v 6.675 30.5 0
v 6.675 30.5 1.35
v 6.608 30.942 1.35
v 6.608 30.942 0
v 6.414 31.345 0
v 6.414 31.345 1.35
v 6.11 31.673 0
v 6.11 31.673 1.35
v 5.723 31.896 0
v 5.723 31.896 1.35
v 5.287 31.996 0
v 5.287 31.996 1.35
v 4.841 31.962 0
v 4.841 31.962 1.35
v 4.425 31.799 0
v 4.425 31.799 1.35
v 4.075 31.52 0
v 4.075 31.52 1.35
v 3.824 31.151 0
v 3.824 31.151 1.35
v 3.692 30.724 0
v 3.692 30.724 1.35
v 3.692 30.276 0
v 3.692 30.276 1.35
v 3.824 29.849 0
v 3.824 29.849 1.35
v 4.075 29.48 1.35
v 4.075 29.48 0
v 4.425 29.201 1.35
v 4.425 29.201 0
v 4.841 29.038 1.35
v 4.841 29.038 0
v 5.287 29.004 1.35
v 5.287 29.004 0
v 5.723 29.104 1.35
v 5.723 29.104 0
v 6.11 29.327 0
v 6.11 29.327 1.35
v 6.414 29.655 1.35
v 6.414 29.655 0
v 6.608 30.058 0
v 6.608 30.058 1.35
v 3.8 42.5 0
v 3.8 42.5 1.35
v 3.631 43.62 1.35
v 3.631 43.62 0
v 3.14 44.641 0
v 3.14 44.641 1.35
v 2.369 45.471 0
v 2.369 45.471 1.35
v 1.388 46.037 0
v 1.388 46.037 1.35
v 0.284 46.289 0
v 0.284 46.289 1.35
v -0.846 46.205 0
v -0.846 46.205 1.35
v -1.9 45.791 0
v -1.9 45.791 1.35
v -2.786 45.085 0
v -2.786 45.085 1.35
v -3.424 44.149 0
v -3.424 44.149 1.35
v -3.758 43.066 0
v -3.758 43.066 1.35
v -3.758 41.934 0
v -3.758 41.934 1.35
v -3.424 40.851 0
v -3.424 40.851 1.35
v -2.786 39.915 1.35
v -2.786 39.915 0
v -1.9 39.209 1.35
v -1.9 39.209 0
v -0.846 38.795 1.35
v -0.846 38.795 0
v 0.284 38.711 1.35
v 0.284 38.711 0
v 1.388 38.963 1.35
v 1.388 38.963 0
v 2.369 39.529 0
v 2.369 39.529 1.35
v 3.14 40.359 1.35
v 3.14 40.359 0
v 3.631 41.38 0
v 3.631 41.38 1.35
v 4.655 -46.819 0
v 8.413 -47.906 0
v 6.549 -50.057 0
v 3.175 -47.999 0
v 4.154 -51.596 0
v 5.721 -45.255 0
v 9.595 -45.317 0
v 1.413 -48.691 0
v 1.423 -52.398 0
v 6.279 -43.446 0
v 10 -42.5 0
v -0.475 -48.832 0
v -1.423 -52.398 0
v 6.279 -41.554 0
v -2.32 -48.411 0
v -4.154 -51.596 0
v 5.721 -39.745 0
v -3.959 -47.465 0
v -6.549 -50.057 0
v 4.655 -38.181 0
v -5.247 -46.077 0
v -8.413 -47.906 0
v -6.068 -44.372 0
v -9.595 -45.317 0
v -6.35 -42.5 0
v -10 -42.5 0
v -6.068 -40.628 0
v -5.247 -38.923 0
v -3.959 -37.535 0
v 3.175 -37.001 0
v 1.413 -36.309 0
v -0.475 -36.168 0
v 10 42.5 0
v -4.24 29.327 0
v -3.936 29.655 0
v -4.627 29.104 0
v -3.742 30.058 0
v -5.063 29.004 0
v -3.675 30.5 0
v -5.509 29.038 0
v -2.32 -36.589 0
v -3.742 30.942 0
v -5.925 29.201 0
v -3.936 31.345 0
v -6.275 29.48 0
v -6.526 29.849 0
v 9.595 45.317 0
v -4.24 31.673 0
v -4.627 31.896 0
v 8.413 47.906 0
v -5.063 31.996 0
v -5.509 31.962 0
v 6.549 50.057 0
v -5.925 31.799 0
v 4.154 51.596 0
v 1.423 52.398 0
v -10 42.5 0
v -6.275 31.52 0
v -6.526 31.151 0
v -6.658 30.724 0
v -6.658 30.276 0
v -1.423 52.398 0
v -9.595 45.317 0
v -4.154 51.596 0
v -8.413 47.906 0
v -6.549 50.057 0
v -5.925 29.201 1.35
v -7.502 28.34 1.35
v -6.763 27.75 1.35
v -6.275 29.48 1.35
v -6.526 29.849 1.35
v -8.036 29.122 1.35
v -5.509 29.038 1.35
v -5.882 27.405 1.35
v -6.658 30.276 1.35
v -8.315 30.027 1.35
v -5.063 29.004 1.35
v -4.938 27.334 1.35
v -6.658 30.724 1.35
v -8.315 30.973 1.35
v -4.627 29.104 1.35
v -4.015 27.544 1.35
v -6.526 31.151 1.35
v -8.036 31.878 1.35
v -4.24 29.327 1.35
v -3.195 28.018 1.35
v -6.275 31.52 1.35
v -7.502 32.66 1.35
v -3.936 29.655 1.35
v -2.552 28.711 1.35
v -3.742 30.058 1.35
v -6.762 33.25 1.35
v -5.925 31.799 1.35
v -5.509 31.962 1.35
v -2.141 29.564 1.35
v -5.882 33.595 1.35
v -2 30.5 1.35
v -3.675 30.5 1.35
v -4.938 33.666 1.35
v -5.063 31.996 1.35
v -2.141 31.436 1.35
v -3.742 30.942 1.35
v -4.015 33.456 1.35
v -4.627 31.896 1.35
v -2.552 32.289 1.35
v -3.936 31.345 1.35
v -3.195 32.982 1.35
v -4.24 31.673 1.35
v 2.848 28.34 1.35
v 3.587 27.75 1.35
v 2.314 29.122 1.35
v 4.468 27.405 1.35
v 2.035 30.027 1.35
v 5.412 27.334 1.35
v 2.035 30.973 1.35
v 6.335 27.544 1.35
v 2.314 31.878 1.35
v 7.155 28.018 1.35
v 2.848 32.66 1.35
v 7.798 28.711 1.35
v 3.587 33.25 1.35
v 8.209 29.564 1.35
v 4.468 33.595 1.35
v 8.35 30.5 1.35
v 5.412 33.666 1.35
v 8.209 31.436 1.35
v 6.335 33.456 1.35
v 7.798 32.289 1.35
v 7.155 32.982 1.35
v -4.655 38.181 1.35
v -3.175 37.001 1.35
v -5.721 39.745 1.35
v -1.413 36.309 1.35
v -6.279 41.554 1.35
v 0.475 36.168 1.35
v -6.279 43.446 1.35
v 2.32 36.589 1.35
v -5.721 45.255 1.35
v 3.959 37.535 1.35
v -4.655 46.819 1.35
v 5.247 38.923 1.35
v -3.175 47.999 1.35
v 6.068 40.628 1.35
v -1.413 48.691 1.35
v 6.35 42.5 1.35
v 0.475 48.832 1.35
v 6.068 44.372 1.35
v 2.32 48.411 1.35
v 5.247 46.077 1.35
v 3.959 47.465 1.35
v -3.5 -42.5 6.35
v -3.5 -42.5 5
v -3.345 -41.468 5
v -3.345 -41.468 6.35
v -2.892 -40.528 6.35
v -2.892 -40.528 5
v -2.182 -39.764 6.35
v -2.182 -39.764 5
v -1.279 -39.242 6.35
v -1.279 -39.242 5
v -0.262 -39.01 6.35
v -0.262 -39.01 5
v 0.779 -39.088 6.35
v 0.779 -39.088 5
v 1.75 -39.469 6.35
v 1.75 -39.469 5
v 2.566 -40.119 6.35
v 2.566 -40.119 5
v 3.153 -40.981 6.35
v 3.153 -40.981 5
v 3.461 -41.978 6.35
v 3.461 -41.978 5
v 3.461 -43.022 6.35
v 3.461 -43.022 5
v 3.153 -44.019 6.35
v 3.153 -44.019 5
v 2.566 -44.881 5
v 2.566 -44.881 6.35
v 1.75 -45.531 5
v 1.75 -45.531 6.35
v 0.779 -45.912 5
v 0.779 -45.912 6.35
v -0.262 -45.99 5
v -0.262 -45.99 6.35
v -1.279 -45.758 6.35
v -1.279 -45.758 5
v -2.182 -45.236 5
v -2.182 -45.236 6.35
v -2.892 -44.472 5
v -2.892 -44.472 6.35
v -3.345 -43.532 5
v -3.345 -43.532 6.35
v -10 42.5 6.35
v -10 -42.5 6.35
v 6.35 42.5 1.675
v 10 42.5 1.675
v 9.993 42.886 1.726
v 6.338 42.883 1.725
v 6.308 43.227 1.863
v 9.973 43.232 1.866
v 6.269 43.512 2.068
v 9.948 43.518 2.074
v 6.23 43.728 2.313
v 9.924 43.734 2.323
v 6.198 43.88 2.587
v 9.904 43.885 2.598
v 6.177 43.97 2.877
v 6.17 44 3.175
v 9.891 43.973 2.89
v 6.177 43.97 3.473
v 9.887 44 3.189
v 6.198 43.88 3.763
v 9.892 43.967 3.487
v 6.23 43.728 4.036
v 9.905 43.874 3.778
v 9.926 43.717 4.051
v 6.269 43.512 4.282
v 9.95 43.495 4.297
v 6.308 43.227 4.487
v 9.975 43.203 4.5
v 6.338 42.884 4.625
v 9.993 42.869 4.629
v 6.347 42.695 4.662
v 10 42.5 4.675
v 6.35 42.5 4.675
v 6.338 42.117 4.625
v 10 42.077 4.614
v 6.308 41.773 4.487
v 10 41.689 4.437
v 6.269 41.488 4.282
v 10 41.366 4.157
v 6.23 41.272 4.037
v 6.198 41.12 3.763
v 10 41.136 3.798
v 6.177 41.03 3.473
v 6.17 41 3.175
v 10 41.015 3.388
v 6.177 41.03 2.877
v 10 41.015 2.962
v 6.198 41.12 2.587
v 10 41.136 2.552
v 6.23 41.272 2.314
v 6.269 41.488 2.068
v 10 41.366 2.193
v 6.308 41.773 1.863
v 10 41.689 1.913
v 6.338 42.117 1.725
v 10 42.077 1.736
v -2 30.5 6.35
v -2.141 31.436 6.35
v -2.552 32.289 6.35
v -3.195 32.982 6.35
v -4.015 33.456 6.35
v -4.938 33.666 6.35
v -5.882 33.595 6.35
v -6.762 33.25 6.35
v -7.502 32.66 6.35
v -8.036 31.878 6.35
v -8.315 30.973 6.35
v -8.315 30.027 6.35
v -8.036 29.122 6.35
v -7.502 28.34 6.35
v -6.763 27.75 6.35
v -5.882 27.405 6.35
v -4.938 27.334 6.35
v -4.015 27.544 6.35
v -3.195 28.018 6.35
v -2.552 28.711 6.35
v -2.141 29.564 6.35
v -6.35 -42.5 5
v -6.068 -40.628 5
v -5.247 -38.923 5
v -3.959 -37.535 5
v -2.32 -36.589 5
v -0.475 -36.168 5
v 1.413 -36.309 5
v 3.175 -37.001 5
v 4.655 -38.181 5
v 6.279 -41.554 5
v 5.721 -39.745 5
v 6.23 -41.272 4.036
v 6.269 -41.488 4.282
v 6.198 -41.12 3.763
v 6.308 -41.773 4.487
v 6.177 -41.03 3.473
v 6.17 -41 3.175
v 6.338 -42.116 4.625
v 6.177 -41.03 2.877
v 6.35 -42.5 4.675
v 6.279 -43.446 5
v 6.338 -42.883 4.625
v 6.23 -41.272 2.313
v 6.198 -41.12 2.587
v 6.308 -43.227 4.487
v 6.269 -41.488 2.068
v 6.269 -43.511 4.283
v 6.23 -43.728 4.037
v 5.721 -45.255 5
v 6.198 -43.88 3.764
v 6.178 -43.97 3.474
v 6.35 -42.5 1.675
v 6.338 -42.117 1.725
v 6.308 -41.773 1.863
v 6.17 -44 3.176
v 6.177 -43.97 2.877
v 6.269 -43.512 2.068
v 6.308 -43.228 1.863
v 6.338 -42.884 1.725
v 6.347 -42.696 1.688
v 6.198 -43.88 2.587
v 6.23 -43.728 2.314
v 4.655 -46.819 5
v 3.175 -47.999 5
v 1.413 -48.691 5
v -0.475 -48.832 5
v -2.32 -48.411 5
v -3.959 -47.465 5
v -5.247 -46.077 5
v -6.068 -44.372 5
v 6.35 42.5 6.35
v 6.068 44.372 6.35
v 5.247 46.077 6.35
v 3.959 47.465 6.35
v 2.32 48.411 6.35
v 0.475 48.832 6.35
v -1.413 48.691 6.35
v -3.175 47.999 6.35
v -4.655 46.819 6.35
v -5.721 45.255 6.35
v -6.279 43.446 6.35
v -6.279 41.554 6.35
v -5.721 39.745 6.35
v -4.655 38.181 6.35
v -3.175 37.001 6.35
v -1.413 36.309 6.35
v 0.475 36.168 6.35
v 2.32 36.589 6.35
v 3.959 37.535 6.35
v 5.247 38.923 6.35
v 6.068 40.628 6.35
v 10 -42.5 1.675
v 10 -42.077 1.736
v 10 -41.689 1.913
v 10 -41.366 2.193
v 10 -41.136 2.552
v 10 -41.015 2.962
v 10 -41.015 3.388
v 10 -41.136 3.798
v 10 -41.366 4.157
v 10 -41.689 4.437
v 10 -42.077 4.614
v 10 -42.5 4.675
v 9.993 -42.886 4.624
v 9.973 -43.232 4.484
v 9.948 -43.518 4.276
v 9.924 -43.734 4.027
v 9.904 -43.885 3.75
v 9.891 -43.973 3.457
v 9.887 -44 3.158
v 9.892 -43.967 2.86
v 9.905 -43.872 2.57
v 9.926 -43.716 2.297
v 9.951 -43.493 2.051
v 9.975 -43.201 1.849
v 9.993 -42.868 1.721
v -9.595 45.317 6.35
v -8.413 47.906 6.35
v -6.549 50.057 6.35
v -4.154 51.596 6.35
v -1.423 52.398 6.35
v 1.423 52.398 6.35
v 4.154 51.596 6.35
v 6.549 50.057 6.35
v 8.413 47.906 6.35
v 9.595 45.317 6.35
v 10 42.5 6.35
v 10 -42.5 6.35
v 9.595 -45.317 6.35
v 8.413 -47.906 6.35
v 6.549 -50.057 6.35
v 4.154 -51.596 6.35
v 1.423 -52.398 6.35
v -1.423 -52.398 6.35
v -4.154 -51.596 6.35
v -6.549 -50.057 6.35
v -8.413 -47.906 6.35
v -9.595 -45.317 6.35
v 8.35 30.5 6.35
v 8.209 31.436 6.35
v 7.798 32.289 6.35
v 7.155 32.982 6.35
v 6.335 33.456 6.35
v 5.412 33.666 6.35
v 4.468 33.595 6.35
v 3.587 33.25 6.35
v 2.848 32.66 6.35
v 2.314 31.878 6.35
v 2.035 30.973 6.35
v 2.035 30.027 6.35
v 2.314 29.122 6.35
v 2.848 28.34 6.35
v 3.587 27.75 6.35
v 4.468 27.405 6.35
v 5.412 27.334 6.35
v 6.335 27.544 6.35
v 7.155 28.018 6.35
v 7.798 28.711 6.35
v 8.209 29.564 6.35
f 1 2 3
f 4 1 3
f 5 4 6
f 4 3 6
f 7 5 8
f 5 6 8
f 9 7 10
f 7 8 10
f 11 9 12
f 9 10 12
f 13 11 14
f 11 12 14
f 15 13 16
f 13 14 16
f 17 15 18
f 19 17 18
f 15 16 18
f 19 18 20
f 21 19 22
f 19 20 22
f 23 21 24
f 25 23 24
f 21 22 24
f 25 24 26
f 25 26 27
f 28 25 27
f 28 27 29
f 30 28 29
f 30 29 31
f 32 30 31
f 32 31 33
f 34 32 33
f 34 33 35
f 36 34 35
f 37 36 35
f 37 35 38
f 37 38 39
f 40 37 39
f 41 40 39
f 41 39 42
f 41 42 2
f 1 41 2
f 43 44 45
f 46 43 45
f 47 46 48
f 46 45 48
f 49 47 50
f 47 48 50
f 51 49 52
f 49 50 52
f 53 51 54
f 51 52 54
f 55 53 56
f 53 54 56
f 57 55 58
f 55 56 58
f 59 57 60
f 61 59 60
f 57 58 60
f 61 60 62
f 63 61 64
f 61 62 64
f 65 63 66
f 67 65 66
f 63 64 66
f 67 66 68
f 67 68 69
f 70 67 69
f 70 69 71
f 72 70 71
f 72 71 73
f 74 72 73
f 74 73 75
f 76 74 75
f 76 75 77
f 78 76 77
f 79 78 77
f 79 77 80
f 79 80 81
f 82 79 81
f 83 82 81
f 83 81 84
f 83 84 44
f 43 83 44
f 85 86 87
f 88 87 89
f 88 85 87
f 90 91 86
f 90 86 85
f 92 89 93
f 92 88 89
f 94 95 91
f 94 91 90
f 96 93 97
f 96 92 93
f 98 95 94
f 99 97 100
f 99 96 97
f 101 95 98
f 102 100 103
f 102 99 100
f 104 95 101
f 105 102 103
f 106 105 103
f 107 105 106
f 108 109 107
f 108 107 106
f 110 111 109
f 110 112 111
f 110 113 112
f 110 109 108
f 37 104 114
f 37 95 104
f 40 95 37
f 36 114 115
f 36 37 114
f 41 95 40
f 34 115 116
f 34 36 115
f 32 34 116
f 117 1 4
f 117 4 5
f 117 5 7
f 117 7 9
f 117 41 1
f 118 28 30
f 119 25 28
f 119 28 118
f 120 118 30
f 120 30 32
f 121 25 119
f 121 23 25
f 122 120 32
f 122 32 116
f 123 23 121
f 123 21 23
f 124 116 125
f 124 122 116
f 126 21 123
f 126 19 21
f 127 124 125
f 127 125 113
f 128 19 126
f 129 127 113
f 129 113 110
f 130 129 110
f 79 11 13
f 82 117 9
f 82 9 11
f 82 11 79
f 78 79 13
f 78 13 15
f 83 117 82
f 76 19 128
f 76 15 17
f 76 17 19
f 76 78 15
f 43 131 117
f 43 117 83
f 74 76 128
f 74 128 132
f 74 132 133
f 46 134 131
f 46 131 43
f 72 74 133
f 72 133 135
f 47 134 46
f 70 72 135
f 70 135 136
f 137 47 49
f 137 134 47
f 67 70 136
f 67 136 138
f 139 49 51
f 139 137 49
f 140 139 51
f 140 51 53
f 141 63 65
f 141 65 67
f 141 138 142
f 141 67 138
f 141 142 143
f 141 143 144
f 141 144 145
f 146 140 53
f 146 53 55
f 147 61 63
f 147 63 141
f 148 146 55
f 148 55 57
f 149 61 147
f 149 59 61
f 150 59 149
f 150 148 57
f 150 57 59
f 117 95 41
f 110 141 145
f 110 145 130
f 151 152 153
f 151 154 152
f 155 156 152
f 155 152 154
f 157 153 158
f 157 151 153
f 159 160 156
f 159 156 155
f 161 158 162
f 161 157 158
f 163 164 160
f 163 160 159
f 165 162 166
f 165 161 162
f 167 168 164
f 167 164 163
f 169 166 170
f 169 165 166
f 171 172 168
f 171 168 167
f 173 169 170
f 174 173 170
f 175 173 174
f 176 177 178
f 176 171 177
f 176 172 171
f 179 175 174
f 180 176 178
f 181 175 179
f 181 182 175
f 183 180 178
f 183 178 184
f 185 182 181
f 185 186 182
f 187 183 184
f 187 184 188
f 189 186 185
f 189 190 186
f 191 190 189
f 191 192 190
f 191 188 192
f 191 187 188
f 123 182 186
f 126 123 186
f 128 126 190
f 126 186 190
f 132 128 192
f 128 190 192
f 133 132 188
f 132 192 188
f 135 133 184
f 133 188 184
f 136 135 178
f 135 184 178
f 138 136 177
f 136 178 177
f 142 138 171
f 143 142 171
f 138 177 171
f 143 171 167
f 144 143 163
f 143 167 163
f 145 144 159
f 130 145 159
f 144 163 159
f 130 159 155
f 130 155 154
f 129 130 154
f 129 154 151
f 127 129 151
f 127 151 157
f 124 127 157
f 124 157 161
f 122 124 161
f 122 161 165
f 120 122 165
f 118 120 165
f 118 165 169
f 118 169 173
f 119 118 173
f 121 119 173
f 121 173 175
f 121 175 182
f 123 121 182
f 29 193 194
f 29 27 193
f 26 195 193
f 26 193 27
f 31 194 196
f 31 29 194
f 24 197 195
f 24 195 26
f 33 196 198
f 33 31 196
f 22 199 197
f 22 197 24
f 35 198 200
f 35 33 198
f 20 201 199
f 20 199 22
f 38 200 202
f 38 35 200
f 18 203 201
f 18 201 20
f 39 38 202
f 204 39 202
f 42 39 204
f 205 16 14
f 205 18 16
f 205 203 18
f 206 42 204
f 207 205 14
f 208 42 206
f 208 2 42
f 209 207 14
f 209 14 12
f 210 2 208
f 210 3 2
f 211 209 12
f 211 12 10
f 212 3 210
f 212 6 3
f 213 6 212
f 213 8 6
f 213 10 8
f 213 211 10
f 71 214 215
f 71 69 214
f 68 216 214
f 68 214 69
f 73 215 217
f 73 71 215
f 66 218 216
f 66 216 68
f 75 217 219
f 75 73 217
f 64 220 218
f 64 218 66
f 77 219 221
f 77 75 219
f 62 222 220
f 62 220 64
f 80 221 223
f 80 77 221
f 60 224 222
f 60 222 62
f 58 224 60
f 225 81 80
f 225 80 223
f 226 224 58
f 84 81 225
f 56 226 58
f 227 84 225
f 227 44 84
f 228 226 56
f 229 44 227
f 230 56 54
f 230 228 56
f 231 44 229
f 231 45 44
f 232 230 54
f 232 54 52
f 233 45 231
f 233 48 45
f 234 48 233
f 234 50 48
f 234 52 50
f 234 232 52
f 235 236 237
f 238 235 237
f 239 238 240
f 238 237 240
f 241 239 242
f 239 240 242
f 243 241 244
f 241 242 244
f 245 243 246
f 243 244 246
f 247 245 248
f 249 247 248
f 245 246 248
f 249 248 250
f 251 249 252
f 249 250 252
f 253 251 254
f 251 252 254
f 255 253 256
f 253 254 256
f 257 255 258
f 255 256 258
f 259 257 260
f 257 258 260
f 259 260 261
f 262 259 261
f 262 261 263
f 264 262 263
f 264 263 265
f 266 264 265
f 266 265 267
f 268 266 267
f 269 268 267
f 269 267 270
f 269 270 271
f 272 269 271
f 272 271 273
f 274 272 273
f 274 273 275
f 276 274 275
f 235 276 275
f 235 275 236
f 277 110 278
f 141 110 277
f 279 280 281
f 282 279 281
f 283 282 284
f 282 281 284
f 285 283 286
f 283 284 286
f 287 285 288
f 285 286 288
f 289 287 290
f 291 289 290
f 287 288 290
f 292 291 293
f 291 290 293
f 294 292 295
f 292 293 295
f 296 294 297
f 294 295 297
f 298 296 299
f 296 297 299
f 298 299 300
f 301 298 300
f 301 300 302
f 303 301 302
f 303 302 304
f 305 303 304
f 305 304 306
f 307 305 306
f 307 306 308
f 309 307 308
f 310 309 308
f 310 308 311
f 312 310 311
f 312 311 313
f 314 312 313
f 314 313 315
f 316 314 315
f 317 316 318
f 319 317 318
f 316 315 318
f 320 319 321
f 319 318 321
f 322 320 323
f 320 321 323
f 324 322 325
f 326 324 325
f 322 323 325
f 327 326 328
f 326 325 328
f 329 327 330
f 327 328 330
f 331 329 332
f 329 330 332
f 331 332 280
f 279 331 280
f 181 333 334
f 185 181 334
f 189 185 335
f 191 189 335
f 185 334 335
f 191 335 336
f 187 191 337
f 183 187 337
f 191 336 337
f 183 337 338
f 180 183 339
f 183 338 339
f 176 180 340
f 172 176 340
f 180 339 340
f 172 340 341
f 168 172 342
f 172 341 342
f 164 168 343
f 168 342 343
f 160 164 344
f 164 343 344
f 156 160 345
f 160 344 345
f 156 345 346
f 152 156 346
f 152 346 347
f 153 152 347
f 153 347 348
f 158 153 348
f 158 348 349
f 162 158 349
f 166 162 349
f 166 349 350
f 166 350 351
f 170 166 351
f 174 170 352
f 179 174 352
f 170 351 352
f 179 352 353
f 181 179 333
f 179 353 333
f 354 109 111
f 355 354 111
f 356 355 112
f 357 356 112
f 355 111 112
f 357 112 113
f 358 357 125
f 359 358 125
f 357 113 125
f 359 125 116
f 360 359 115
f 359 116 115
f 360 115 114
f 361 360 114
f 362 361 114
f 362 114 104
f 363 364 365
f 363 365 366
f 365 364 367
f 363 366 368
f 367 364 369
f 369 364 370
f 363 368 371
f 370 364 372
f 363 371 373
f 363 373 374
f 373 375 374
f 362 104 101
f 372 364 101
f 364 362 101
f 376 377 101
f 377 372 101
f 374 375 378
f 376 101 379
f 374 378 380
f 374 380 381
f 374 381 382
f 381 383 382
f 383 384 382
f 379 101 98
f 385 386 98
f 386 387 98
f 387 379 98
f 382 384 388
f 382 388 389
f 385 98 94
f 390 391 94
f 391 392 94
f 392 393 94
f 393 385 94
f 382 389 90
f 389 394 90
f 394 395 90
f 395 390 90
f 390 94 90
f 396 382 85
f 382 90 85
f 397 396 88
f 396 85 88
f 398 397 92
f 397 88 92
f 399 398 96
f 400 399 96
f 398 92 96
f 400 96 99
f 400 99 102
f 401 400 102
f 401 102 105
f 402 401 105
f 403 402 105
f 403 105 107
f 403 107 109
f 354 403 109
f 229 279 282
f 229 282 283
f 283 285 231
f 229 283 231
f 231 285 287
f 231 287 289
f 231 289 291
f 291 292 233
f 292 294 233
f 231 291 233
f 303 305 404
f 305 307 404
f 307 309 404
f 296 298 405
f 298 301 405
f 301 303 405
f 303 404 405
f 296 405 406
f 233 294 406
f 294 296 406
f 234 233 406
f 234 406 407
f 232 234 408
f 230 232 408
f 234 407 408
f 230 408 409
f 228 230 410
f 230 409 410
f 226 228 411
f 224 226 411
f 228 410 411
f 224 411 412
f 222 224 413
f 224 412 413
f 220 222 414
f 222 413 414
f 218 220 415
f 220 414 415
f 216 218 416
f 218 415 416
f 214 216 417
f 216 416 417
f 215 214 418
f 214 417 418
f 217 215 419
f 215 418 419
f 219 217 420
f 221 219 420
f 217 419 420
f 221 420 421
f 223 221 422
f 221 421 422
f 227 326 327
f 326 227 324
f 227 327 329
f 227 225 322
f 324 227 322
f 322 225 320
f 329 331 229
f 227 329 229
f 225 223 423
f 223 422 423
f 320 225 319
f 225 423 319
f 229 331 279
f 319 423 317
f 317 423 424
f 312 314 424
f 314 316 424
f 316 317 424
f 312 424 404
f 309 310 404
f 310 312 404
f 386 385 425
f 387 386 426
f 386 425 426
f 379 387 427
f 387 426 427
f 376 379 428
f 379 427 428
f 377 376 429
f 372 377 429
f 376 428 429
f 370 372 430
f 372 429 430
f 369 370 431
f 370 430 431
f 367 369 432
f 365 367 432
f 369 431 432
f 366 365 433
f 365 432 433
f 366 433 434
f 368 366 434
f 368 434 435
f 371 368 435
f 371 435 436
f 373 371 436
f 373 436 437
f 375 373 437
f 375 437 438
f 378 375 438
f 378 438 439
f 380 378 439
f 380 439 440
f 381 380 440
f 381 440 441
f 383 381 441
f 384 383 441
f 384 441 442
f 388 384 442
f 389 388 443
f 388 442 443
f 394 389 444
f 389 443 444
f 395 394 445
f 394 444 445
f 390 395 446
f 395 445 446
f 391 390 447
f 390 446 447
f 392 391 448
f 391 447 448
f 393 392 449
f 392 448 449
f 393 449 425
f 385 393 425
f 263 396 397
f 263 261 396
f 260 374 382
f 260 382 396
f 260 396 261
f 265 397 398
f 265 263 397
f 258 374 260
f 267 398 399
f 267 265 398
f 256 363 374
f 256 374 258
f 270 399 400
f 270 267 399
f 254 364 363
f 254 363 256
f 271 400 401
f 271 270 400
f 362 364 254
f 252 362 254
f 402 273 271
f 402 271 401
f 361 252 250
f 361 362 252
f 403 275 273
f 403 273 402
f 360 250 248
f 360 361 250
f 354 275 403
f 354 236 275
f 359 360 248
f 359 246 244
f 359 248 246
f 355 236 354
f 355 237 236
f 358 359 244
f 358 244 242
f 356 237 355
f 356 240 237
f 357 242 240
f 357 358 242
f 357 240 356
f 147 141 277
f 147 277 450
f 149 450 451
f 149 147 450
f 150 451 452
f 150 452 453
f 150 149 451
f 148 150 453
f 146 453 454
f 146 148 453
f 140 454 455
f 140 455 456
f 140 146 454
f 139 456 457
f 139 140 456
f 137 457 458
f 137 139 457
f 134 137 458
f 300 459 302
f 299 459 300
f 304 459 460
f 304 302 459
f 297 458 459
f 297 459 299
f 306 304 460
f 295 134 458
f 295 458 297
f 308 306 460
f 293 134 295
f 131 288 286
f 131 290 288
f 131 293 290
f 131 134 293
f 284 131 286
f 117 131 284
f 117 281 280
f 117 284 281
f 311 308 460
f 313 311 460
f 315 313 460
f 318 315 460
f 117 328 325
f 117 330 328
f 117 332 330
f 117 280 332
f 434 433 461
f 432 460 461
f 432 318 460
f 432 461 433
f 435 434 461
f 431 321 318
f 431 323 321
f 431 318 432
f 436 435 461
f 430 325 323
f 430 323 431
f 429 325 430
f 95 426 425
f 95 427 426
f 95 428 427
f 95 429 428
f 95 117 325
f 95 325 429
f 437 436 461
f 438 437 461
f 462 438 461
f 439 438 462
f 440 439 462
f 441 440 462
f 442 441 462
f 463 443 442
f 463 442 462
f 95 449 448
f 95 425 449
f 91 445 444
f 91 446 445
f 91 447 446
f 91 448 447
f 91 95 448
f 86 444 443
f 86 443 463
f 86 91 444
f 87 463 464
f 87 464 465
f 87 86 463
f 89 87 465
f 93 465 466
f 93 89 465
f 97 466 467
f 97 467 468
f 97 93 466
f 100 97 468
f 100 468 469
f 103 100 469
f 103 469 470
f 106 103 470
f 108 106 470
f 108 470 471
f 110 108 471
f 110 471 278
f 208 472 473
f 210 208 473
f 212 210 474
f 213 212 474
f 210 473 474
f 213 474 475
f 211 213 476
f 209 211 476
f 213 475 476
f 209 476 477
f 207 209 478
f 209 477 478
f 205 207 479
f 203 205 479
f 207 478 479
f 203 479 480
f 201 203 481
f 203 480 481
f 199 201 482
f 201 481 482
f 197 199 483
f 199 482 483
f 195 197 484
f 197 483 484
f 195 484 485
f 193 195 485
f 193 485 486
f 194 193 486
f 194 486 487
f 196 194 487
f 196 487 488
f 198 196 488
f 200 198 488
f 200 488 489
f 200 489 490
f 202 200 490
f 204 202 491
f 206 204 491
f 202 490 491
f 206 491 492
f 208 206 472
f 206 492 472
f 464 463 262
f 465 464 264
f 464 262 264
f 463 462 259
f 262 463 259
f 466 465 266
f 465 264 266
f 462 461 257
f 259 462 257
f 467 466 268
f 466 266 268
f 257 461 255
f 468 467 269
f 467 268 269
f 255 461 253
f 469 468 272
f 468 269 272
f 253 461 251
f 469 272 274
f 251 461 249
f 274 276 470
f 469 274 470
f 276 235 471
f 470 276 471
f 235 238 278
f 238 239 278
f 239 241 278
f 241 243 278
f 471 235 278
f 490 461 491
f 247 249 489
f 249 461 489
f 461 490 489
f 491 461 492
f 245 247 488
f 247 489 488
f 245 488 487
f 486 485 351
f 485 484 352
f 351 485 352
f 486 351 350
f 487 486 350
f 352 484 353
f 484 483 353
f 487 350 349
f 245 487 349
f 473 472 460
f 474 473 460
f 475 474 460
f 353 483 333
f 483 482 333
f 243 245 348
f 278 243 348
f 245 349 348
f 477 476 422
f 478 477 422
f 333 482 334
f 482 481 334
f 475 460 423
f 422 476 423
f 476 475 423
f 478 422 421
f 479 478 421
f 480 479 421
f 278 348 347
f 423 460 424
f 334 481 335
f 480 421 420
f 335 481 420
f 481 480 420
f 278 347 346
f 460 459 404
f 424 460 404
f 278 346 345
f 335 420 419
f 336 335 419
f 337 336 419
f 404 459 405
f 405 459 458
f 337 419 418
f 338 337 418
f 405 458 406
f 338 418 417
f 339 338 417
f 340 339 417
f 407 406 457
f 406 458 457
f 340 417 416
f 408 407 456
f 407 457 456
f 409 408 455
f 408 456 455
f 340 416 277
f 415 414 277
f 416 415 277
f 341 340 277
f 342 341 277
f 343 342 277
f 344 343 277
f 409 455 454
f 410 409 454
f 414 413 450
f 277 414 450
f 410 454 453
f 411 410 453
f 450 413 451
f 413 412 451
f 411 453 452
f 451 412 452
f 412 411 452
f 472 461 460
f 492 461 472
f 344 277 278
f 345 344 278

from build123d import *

# Parameters (mm, degrees)
SALIENTE_EXTRUIR1_DEPTH = 6.35
CROQUIS2_R              = 6.35
CORTAR_EXTRUIR1_DEPTH   = 5
CROQUIS3_R              = 3.8
CORTAR_EXTRUIR2_DEPTH   = 2.35
CROQUIS4_R              = 3.175
CORTAR_EXTRUIR3_DEPTH   = 5
CROQUIS5_R              = 1.5
CORTAR_EXTRUIR4_DEPTH   = 5
CROQUIS6_R              = 1.5
CORTAR_EXTRUIR5_DEPTH   = 5
CROQUIS7_R              = 6.35
CORTAR_EXTRUIR6_DEPTH   = 5
CROQUIS8_R              = 3.5
CORTAR_EXTRUIR7_DEPTH   = 5
CROQUIS9_R              = 1.5
CORTAR_EXTRUIR8_DEPTH   = 5


with BuildPart() as part:
    # Croquis1 → Saliente-Extruir1 (new body)
    with BuildSketch(Plane.XY):
        with BuildLine():
            Line((10, 42.5), (10, -42.5))
            ThreePointArc((10, -42.5), (0, -52.5), (-10, -42.5))
            Line((-10, -42.5), (-10, 42.5))
            ThreePointArc((-10, 42.5), (0, 52.5), (10, 42.5))
        make_face()
    extrude(amount=SALIENTE_EXTRUIR1_DEPTH)

    # Croquis2 → Cortar-Extruir1 (cut)
    with BuildSketch(Plane.XY.offset(6.35)):
        with Locations((0, 42.5)):
            Circle(CROQUIS2_R)
    extrude(amount=-CORTAR_EXTRUIR1_DEPTH, mode=Mode.SUBTRACT)

    # Croquis3 → Cortar-Extruir2 (cut, through all)
    with BuildSketch(Plane.XY.offset(1.35)):
        with Locations((0, 42.5)):
            Circle(CROQUIS3_R)
    extrude(amount=-CORTAR_EXTRUIR2_DEPTH, mode=Mode.SUBTRACT)

    # Croquis4 → Cortar-Extruir3 (cut)
    with BuildSketch(Plane.XY.offset(6.35)):
        with Locations((5.175, 30.5)):
            Circle(CROQUIS4_R)
        with Locations((-5.175, 30.5)):
            Circle(CROQUIS4_R)
    extrude(amount=-CORTAR_EXTRUIR3_DEPTH, mode=Mode.SUBTRACT)

    # Croquis5 → Cortar-Extruir4 (cut)
    with BuildSketch(Plane.XY.offset(1.35)):
        with Locations((-5.175, 30.5)):
            Circle(CROQUIS5_R)
        with Locations((5.175, 30.5)):
            Circle(CROQUIS5_R)
    extrude(amount=-CORTAR_EXTRUIR4_DEPTH, mode=Mode.SUBTRACT)

    # Croquis6 → Cortar-Extruir5 (cut)
    with BuildSketch(Plane(origin=(10, 0, 0), x_dir=(0, 0, -1), z_dir=(1, 0, 0))):
        with Locations((-3.175, 42.5)):
            Circle(CROQUIS6_R)
    extrude(amount=-CORTAR_EXTRUIR5_DEPTH, mode=Mode.SUBTRACT)

    # Croquis7 → Cortar-Extruir6 (cut)
    with BuildSketch(Plane(origin=(0, 0, 0), x_dir=(-1, 0, 0), z_dir=(0, 0, -1))):
        with Locations((0, -42.5)):
            Circle(CROQUIS7_R)
    extrude(amount=-CORTAR_EXTRUIR6_DEPTH, mode=Mode.SUBTRACT)

    # Croquis8 → Cortar-Extruir7 (cut)
    with BuildSketch(Plane(origin=(0, 0, 5), x_dir=(-1, 0, 0), z_dir=(0, 0, -1))):
        with Locations((0, -42.5)):
            Circle(CROQUIS8_R)
    extrude(amount=-CORTAR_EXTRUIR7_DEPTH, mode=Mode.SUBTRACT)

    # Croquis9 → Cortar-Extruir8 (cut)
    with BuildSketch(Plane(origin=(10, 0, 0), x_dir=(0, 0, -1), z_dir=(1, 0, 0))):
        with Locations((-3.175, -42.5)):
            Circle(CROQUIS9_R)
    extrude(amount=-CORTAR_EXTRUIR8_DEPTH, mode=Mode.SUBTRACT)


solid = part.part
